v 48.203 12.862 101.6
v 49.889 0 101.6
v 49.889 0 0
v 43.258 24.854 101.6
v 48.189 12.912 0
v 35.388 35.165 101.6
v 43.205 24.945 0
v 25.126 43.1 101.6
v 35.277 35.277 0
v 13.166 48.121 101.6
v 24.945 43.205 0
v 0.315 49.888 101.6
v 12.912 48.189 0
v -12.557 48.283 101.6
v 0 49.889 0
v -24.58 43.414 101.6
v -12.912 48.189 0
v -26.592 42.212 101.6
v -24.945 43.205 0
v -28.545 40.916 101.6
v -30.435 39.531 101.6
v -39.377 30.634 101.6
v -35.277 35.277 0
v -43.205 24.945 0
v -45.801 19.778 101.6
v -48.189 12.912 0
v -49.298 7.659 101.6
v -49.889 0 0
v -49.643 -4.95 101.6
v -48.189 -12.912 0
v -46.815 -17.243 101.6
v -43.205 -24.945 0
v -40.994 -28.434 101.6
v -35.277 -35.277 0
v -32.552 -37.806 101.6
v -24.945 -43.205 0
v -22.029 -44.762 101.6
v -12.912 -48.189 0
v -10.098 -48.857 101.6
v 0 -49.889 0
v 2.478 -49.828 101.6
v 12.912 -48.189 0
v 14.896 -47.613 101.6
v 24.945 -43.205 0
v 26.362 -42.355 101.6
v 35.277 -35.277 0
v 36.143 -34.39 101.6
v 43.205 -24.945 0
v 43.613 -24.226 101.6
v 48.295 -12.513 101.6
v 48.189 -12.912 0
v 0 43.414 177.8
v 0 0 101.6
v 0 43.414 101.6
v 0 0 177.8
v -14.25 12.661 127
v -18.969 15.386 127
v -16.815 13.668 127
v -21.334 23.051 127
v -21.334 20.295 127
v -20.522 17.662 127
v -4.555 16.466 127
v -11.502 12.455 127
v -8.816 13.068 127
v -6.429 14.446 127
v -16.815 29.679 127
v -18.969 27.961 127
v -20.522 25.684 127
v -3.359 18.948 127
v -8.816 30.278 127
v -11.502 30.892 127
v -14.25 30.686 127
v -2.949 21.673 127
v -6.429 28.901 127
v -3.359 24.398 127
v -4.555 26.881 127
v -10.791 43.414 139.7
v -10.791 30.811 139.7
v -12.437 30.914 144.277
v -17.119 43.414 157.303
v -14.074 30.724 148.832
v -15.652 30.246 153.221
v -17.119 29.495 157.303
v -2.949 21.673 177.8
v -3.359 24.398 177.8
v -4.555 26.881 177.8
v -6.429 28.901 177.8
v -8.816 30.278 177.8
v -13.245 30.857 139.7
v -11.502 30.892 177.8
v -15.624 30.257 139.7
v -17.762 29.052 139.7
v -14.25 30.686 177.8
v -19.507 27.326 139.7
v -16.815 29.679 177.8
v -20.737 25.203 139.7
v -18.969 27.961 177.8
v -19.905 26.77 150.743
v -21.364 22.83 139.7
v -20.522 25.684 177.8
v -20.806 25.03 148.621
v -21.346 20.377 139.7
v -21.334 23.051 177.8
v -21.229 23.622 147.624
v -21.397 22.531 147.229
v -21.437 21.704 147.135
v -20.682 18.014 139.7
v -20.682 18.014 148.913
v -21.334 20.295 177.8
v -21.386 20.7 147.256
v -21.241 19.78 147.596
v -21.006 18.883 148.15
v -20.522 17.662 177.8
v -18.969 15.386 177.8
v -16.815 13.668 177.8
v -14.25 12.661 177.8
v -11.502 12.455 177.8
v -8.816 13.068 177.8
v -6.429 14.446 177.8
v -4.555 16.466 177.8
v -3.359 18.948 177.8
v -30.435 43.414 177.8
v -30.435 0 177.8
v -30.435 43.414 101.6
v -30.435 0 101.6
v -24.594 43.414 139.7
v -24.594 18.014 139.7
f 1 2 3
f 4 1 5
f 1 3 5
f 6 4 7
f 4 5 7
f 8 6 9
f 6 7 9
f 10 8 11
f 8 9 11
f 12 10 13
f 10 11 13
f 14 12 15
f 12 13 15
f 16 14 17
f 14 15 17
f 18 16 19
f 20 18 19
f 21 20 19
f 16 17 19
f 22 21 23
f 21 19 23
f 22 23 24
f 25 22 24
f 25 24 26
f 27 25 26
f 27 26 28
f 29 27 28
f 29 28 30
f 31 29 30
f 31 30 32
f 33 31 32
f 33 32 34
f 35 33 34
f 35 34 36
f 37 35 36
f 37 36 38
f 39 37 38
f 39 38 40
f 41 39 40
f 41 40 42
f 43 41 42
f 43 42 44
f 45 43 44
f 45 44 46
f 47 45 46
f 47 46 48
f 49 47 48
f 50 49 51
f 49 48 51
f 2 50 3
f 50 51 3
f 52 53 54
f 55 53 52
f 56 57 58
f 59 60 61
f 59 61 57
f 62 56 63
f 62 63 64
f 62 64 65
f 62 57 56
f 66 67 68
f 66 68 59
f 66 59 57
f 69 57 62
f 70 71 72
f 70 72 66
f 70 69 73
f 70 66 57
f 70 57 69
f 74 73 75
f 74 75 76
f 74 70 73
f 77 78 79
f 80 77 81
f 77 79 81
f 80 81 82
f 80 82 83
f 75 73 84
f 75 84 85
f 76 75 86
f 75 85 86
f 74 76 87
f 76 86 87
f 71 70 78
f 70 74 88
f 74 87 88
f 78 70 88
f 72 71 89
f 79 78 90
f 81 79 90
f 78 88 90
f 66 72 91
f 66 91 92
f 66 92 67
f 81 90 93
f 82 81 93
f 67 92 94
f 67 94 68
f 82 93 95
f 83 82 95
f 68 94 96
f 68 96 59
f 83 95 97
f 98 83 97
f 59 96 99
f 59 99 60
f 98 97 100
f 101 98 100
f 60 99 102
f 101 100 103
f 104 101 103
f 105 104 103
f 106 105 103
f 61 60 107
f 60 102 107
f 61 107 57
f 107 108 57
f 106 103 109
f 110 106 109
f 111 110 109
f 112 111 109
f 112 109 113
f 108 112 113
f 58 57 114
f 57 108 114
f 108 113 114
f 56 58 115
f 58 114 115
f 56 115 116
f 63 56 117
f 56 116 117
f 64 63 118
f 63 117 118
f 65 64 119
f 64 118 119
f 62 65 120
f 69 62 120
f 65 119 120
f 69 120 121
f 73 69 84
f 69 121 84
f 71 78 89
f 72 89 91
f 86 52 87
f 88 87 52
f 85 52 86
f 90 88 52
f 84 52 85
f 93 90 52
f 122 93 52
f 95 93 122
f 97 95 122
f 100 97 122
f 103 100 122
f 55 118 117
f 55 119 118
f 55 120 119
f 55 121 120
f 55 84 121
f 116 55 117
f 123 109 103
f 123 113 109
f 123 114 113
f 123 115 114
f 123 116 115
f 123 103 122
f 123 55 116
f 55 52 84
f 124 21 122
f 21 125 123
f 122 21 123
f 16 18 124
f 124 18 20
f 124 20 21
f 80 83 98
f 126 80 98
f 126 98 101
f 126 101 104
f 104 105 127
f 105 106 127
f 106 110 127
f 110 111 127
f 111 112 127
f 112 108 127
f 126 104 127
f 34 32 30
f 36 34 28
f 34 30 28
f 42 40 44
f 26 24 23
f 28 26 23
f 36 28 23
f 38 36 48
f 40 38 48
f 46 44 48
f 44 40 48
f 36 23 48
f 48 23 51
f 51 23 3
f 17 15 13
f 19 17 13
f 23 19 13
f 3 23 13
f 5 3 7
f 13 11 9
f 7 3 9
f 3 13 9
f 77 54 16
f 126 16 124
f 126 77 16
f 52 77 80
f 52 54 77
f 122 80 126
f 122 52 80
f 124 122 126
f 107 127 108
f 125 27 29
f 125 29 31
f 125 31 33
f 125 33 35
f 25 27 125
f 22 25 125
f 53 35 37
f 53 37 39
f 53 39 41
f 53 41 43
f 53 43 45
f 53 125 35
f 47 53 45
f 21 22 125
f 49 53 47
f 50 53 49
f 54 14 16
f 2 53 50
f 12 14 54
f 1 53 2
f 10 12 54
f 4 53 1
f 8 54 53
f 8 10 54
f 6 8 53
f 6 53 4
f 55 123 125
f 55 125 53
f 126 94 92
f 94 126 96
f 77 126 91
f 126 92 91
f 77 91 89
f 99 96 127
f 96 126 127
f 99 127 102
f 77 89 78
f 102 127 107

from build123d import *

# Parameters (mm, degrees)
F0_R     = 49.8893389147
F1_DEPTH = 101.6
F2_W     = 30.4349269718
F2_H     = 18.0141068995
F3_DEPTH = 76.2
F4_W     = 30.4349269718
F4_H     = 76.2
F5_DEPTH = 25.4
F6_R     = 9.2441651786
F7_DEPTH = 50.8


with BuildPart() as f1:
    # F0 (on Top) → F1 (new body)
    with BuildSketch(Plane.XY):
        Circle(F0_R)
    extrude(amount=F1_DEPTH)

    # F2 (on face) → F3 (join)
    with BuildSketch(Plane.XY.offset(101.6)):
        with Locations((-15.2174634859, 9.0070534497)):
            Rectangle(F2_W, F2_H)
    extrude(amount=F3_DEPTH)

    # F4 (on face) → F5 (join)
    with BuildSketch(Plane(origin=(0, 18.0141068995, 0), x_dir=(-1, 0, 0), z_dir=(0, 1, 0))):
        with Locations((15.2174634859, 139.7)):
            Rectangle(F4_W, F4_H)
        Polygon((10.7914097607, 139.7), (17.1193554997, 157.3033481836), (24.5937909931, 139.7), align=None, mode=Mode.SUBTRACT)
    extrude(amount=F5_DEPTH)

    # F6 (on face) → F7 (cut)
    with BuildSketch(Plane.XY.offset(177.8)):
        with Locations((-12.1928649023, 21.6732509434)):
            Circle(F6_R)
    extrude(amount=-F7_DEPTH, mode=Mode.SUBTRACT)


solid = f1.part
